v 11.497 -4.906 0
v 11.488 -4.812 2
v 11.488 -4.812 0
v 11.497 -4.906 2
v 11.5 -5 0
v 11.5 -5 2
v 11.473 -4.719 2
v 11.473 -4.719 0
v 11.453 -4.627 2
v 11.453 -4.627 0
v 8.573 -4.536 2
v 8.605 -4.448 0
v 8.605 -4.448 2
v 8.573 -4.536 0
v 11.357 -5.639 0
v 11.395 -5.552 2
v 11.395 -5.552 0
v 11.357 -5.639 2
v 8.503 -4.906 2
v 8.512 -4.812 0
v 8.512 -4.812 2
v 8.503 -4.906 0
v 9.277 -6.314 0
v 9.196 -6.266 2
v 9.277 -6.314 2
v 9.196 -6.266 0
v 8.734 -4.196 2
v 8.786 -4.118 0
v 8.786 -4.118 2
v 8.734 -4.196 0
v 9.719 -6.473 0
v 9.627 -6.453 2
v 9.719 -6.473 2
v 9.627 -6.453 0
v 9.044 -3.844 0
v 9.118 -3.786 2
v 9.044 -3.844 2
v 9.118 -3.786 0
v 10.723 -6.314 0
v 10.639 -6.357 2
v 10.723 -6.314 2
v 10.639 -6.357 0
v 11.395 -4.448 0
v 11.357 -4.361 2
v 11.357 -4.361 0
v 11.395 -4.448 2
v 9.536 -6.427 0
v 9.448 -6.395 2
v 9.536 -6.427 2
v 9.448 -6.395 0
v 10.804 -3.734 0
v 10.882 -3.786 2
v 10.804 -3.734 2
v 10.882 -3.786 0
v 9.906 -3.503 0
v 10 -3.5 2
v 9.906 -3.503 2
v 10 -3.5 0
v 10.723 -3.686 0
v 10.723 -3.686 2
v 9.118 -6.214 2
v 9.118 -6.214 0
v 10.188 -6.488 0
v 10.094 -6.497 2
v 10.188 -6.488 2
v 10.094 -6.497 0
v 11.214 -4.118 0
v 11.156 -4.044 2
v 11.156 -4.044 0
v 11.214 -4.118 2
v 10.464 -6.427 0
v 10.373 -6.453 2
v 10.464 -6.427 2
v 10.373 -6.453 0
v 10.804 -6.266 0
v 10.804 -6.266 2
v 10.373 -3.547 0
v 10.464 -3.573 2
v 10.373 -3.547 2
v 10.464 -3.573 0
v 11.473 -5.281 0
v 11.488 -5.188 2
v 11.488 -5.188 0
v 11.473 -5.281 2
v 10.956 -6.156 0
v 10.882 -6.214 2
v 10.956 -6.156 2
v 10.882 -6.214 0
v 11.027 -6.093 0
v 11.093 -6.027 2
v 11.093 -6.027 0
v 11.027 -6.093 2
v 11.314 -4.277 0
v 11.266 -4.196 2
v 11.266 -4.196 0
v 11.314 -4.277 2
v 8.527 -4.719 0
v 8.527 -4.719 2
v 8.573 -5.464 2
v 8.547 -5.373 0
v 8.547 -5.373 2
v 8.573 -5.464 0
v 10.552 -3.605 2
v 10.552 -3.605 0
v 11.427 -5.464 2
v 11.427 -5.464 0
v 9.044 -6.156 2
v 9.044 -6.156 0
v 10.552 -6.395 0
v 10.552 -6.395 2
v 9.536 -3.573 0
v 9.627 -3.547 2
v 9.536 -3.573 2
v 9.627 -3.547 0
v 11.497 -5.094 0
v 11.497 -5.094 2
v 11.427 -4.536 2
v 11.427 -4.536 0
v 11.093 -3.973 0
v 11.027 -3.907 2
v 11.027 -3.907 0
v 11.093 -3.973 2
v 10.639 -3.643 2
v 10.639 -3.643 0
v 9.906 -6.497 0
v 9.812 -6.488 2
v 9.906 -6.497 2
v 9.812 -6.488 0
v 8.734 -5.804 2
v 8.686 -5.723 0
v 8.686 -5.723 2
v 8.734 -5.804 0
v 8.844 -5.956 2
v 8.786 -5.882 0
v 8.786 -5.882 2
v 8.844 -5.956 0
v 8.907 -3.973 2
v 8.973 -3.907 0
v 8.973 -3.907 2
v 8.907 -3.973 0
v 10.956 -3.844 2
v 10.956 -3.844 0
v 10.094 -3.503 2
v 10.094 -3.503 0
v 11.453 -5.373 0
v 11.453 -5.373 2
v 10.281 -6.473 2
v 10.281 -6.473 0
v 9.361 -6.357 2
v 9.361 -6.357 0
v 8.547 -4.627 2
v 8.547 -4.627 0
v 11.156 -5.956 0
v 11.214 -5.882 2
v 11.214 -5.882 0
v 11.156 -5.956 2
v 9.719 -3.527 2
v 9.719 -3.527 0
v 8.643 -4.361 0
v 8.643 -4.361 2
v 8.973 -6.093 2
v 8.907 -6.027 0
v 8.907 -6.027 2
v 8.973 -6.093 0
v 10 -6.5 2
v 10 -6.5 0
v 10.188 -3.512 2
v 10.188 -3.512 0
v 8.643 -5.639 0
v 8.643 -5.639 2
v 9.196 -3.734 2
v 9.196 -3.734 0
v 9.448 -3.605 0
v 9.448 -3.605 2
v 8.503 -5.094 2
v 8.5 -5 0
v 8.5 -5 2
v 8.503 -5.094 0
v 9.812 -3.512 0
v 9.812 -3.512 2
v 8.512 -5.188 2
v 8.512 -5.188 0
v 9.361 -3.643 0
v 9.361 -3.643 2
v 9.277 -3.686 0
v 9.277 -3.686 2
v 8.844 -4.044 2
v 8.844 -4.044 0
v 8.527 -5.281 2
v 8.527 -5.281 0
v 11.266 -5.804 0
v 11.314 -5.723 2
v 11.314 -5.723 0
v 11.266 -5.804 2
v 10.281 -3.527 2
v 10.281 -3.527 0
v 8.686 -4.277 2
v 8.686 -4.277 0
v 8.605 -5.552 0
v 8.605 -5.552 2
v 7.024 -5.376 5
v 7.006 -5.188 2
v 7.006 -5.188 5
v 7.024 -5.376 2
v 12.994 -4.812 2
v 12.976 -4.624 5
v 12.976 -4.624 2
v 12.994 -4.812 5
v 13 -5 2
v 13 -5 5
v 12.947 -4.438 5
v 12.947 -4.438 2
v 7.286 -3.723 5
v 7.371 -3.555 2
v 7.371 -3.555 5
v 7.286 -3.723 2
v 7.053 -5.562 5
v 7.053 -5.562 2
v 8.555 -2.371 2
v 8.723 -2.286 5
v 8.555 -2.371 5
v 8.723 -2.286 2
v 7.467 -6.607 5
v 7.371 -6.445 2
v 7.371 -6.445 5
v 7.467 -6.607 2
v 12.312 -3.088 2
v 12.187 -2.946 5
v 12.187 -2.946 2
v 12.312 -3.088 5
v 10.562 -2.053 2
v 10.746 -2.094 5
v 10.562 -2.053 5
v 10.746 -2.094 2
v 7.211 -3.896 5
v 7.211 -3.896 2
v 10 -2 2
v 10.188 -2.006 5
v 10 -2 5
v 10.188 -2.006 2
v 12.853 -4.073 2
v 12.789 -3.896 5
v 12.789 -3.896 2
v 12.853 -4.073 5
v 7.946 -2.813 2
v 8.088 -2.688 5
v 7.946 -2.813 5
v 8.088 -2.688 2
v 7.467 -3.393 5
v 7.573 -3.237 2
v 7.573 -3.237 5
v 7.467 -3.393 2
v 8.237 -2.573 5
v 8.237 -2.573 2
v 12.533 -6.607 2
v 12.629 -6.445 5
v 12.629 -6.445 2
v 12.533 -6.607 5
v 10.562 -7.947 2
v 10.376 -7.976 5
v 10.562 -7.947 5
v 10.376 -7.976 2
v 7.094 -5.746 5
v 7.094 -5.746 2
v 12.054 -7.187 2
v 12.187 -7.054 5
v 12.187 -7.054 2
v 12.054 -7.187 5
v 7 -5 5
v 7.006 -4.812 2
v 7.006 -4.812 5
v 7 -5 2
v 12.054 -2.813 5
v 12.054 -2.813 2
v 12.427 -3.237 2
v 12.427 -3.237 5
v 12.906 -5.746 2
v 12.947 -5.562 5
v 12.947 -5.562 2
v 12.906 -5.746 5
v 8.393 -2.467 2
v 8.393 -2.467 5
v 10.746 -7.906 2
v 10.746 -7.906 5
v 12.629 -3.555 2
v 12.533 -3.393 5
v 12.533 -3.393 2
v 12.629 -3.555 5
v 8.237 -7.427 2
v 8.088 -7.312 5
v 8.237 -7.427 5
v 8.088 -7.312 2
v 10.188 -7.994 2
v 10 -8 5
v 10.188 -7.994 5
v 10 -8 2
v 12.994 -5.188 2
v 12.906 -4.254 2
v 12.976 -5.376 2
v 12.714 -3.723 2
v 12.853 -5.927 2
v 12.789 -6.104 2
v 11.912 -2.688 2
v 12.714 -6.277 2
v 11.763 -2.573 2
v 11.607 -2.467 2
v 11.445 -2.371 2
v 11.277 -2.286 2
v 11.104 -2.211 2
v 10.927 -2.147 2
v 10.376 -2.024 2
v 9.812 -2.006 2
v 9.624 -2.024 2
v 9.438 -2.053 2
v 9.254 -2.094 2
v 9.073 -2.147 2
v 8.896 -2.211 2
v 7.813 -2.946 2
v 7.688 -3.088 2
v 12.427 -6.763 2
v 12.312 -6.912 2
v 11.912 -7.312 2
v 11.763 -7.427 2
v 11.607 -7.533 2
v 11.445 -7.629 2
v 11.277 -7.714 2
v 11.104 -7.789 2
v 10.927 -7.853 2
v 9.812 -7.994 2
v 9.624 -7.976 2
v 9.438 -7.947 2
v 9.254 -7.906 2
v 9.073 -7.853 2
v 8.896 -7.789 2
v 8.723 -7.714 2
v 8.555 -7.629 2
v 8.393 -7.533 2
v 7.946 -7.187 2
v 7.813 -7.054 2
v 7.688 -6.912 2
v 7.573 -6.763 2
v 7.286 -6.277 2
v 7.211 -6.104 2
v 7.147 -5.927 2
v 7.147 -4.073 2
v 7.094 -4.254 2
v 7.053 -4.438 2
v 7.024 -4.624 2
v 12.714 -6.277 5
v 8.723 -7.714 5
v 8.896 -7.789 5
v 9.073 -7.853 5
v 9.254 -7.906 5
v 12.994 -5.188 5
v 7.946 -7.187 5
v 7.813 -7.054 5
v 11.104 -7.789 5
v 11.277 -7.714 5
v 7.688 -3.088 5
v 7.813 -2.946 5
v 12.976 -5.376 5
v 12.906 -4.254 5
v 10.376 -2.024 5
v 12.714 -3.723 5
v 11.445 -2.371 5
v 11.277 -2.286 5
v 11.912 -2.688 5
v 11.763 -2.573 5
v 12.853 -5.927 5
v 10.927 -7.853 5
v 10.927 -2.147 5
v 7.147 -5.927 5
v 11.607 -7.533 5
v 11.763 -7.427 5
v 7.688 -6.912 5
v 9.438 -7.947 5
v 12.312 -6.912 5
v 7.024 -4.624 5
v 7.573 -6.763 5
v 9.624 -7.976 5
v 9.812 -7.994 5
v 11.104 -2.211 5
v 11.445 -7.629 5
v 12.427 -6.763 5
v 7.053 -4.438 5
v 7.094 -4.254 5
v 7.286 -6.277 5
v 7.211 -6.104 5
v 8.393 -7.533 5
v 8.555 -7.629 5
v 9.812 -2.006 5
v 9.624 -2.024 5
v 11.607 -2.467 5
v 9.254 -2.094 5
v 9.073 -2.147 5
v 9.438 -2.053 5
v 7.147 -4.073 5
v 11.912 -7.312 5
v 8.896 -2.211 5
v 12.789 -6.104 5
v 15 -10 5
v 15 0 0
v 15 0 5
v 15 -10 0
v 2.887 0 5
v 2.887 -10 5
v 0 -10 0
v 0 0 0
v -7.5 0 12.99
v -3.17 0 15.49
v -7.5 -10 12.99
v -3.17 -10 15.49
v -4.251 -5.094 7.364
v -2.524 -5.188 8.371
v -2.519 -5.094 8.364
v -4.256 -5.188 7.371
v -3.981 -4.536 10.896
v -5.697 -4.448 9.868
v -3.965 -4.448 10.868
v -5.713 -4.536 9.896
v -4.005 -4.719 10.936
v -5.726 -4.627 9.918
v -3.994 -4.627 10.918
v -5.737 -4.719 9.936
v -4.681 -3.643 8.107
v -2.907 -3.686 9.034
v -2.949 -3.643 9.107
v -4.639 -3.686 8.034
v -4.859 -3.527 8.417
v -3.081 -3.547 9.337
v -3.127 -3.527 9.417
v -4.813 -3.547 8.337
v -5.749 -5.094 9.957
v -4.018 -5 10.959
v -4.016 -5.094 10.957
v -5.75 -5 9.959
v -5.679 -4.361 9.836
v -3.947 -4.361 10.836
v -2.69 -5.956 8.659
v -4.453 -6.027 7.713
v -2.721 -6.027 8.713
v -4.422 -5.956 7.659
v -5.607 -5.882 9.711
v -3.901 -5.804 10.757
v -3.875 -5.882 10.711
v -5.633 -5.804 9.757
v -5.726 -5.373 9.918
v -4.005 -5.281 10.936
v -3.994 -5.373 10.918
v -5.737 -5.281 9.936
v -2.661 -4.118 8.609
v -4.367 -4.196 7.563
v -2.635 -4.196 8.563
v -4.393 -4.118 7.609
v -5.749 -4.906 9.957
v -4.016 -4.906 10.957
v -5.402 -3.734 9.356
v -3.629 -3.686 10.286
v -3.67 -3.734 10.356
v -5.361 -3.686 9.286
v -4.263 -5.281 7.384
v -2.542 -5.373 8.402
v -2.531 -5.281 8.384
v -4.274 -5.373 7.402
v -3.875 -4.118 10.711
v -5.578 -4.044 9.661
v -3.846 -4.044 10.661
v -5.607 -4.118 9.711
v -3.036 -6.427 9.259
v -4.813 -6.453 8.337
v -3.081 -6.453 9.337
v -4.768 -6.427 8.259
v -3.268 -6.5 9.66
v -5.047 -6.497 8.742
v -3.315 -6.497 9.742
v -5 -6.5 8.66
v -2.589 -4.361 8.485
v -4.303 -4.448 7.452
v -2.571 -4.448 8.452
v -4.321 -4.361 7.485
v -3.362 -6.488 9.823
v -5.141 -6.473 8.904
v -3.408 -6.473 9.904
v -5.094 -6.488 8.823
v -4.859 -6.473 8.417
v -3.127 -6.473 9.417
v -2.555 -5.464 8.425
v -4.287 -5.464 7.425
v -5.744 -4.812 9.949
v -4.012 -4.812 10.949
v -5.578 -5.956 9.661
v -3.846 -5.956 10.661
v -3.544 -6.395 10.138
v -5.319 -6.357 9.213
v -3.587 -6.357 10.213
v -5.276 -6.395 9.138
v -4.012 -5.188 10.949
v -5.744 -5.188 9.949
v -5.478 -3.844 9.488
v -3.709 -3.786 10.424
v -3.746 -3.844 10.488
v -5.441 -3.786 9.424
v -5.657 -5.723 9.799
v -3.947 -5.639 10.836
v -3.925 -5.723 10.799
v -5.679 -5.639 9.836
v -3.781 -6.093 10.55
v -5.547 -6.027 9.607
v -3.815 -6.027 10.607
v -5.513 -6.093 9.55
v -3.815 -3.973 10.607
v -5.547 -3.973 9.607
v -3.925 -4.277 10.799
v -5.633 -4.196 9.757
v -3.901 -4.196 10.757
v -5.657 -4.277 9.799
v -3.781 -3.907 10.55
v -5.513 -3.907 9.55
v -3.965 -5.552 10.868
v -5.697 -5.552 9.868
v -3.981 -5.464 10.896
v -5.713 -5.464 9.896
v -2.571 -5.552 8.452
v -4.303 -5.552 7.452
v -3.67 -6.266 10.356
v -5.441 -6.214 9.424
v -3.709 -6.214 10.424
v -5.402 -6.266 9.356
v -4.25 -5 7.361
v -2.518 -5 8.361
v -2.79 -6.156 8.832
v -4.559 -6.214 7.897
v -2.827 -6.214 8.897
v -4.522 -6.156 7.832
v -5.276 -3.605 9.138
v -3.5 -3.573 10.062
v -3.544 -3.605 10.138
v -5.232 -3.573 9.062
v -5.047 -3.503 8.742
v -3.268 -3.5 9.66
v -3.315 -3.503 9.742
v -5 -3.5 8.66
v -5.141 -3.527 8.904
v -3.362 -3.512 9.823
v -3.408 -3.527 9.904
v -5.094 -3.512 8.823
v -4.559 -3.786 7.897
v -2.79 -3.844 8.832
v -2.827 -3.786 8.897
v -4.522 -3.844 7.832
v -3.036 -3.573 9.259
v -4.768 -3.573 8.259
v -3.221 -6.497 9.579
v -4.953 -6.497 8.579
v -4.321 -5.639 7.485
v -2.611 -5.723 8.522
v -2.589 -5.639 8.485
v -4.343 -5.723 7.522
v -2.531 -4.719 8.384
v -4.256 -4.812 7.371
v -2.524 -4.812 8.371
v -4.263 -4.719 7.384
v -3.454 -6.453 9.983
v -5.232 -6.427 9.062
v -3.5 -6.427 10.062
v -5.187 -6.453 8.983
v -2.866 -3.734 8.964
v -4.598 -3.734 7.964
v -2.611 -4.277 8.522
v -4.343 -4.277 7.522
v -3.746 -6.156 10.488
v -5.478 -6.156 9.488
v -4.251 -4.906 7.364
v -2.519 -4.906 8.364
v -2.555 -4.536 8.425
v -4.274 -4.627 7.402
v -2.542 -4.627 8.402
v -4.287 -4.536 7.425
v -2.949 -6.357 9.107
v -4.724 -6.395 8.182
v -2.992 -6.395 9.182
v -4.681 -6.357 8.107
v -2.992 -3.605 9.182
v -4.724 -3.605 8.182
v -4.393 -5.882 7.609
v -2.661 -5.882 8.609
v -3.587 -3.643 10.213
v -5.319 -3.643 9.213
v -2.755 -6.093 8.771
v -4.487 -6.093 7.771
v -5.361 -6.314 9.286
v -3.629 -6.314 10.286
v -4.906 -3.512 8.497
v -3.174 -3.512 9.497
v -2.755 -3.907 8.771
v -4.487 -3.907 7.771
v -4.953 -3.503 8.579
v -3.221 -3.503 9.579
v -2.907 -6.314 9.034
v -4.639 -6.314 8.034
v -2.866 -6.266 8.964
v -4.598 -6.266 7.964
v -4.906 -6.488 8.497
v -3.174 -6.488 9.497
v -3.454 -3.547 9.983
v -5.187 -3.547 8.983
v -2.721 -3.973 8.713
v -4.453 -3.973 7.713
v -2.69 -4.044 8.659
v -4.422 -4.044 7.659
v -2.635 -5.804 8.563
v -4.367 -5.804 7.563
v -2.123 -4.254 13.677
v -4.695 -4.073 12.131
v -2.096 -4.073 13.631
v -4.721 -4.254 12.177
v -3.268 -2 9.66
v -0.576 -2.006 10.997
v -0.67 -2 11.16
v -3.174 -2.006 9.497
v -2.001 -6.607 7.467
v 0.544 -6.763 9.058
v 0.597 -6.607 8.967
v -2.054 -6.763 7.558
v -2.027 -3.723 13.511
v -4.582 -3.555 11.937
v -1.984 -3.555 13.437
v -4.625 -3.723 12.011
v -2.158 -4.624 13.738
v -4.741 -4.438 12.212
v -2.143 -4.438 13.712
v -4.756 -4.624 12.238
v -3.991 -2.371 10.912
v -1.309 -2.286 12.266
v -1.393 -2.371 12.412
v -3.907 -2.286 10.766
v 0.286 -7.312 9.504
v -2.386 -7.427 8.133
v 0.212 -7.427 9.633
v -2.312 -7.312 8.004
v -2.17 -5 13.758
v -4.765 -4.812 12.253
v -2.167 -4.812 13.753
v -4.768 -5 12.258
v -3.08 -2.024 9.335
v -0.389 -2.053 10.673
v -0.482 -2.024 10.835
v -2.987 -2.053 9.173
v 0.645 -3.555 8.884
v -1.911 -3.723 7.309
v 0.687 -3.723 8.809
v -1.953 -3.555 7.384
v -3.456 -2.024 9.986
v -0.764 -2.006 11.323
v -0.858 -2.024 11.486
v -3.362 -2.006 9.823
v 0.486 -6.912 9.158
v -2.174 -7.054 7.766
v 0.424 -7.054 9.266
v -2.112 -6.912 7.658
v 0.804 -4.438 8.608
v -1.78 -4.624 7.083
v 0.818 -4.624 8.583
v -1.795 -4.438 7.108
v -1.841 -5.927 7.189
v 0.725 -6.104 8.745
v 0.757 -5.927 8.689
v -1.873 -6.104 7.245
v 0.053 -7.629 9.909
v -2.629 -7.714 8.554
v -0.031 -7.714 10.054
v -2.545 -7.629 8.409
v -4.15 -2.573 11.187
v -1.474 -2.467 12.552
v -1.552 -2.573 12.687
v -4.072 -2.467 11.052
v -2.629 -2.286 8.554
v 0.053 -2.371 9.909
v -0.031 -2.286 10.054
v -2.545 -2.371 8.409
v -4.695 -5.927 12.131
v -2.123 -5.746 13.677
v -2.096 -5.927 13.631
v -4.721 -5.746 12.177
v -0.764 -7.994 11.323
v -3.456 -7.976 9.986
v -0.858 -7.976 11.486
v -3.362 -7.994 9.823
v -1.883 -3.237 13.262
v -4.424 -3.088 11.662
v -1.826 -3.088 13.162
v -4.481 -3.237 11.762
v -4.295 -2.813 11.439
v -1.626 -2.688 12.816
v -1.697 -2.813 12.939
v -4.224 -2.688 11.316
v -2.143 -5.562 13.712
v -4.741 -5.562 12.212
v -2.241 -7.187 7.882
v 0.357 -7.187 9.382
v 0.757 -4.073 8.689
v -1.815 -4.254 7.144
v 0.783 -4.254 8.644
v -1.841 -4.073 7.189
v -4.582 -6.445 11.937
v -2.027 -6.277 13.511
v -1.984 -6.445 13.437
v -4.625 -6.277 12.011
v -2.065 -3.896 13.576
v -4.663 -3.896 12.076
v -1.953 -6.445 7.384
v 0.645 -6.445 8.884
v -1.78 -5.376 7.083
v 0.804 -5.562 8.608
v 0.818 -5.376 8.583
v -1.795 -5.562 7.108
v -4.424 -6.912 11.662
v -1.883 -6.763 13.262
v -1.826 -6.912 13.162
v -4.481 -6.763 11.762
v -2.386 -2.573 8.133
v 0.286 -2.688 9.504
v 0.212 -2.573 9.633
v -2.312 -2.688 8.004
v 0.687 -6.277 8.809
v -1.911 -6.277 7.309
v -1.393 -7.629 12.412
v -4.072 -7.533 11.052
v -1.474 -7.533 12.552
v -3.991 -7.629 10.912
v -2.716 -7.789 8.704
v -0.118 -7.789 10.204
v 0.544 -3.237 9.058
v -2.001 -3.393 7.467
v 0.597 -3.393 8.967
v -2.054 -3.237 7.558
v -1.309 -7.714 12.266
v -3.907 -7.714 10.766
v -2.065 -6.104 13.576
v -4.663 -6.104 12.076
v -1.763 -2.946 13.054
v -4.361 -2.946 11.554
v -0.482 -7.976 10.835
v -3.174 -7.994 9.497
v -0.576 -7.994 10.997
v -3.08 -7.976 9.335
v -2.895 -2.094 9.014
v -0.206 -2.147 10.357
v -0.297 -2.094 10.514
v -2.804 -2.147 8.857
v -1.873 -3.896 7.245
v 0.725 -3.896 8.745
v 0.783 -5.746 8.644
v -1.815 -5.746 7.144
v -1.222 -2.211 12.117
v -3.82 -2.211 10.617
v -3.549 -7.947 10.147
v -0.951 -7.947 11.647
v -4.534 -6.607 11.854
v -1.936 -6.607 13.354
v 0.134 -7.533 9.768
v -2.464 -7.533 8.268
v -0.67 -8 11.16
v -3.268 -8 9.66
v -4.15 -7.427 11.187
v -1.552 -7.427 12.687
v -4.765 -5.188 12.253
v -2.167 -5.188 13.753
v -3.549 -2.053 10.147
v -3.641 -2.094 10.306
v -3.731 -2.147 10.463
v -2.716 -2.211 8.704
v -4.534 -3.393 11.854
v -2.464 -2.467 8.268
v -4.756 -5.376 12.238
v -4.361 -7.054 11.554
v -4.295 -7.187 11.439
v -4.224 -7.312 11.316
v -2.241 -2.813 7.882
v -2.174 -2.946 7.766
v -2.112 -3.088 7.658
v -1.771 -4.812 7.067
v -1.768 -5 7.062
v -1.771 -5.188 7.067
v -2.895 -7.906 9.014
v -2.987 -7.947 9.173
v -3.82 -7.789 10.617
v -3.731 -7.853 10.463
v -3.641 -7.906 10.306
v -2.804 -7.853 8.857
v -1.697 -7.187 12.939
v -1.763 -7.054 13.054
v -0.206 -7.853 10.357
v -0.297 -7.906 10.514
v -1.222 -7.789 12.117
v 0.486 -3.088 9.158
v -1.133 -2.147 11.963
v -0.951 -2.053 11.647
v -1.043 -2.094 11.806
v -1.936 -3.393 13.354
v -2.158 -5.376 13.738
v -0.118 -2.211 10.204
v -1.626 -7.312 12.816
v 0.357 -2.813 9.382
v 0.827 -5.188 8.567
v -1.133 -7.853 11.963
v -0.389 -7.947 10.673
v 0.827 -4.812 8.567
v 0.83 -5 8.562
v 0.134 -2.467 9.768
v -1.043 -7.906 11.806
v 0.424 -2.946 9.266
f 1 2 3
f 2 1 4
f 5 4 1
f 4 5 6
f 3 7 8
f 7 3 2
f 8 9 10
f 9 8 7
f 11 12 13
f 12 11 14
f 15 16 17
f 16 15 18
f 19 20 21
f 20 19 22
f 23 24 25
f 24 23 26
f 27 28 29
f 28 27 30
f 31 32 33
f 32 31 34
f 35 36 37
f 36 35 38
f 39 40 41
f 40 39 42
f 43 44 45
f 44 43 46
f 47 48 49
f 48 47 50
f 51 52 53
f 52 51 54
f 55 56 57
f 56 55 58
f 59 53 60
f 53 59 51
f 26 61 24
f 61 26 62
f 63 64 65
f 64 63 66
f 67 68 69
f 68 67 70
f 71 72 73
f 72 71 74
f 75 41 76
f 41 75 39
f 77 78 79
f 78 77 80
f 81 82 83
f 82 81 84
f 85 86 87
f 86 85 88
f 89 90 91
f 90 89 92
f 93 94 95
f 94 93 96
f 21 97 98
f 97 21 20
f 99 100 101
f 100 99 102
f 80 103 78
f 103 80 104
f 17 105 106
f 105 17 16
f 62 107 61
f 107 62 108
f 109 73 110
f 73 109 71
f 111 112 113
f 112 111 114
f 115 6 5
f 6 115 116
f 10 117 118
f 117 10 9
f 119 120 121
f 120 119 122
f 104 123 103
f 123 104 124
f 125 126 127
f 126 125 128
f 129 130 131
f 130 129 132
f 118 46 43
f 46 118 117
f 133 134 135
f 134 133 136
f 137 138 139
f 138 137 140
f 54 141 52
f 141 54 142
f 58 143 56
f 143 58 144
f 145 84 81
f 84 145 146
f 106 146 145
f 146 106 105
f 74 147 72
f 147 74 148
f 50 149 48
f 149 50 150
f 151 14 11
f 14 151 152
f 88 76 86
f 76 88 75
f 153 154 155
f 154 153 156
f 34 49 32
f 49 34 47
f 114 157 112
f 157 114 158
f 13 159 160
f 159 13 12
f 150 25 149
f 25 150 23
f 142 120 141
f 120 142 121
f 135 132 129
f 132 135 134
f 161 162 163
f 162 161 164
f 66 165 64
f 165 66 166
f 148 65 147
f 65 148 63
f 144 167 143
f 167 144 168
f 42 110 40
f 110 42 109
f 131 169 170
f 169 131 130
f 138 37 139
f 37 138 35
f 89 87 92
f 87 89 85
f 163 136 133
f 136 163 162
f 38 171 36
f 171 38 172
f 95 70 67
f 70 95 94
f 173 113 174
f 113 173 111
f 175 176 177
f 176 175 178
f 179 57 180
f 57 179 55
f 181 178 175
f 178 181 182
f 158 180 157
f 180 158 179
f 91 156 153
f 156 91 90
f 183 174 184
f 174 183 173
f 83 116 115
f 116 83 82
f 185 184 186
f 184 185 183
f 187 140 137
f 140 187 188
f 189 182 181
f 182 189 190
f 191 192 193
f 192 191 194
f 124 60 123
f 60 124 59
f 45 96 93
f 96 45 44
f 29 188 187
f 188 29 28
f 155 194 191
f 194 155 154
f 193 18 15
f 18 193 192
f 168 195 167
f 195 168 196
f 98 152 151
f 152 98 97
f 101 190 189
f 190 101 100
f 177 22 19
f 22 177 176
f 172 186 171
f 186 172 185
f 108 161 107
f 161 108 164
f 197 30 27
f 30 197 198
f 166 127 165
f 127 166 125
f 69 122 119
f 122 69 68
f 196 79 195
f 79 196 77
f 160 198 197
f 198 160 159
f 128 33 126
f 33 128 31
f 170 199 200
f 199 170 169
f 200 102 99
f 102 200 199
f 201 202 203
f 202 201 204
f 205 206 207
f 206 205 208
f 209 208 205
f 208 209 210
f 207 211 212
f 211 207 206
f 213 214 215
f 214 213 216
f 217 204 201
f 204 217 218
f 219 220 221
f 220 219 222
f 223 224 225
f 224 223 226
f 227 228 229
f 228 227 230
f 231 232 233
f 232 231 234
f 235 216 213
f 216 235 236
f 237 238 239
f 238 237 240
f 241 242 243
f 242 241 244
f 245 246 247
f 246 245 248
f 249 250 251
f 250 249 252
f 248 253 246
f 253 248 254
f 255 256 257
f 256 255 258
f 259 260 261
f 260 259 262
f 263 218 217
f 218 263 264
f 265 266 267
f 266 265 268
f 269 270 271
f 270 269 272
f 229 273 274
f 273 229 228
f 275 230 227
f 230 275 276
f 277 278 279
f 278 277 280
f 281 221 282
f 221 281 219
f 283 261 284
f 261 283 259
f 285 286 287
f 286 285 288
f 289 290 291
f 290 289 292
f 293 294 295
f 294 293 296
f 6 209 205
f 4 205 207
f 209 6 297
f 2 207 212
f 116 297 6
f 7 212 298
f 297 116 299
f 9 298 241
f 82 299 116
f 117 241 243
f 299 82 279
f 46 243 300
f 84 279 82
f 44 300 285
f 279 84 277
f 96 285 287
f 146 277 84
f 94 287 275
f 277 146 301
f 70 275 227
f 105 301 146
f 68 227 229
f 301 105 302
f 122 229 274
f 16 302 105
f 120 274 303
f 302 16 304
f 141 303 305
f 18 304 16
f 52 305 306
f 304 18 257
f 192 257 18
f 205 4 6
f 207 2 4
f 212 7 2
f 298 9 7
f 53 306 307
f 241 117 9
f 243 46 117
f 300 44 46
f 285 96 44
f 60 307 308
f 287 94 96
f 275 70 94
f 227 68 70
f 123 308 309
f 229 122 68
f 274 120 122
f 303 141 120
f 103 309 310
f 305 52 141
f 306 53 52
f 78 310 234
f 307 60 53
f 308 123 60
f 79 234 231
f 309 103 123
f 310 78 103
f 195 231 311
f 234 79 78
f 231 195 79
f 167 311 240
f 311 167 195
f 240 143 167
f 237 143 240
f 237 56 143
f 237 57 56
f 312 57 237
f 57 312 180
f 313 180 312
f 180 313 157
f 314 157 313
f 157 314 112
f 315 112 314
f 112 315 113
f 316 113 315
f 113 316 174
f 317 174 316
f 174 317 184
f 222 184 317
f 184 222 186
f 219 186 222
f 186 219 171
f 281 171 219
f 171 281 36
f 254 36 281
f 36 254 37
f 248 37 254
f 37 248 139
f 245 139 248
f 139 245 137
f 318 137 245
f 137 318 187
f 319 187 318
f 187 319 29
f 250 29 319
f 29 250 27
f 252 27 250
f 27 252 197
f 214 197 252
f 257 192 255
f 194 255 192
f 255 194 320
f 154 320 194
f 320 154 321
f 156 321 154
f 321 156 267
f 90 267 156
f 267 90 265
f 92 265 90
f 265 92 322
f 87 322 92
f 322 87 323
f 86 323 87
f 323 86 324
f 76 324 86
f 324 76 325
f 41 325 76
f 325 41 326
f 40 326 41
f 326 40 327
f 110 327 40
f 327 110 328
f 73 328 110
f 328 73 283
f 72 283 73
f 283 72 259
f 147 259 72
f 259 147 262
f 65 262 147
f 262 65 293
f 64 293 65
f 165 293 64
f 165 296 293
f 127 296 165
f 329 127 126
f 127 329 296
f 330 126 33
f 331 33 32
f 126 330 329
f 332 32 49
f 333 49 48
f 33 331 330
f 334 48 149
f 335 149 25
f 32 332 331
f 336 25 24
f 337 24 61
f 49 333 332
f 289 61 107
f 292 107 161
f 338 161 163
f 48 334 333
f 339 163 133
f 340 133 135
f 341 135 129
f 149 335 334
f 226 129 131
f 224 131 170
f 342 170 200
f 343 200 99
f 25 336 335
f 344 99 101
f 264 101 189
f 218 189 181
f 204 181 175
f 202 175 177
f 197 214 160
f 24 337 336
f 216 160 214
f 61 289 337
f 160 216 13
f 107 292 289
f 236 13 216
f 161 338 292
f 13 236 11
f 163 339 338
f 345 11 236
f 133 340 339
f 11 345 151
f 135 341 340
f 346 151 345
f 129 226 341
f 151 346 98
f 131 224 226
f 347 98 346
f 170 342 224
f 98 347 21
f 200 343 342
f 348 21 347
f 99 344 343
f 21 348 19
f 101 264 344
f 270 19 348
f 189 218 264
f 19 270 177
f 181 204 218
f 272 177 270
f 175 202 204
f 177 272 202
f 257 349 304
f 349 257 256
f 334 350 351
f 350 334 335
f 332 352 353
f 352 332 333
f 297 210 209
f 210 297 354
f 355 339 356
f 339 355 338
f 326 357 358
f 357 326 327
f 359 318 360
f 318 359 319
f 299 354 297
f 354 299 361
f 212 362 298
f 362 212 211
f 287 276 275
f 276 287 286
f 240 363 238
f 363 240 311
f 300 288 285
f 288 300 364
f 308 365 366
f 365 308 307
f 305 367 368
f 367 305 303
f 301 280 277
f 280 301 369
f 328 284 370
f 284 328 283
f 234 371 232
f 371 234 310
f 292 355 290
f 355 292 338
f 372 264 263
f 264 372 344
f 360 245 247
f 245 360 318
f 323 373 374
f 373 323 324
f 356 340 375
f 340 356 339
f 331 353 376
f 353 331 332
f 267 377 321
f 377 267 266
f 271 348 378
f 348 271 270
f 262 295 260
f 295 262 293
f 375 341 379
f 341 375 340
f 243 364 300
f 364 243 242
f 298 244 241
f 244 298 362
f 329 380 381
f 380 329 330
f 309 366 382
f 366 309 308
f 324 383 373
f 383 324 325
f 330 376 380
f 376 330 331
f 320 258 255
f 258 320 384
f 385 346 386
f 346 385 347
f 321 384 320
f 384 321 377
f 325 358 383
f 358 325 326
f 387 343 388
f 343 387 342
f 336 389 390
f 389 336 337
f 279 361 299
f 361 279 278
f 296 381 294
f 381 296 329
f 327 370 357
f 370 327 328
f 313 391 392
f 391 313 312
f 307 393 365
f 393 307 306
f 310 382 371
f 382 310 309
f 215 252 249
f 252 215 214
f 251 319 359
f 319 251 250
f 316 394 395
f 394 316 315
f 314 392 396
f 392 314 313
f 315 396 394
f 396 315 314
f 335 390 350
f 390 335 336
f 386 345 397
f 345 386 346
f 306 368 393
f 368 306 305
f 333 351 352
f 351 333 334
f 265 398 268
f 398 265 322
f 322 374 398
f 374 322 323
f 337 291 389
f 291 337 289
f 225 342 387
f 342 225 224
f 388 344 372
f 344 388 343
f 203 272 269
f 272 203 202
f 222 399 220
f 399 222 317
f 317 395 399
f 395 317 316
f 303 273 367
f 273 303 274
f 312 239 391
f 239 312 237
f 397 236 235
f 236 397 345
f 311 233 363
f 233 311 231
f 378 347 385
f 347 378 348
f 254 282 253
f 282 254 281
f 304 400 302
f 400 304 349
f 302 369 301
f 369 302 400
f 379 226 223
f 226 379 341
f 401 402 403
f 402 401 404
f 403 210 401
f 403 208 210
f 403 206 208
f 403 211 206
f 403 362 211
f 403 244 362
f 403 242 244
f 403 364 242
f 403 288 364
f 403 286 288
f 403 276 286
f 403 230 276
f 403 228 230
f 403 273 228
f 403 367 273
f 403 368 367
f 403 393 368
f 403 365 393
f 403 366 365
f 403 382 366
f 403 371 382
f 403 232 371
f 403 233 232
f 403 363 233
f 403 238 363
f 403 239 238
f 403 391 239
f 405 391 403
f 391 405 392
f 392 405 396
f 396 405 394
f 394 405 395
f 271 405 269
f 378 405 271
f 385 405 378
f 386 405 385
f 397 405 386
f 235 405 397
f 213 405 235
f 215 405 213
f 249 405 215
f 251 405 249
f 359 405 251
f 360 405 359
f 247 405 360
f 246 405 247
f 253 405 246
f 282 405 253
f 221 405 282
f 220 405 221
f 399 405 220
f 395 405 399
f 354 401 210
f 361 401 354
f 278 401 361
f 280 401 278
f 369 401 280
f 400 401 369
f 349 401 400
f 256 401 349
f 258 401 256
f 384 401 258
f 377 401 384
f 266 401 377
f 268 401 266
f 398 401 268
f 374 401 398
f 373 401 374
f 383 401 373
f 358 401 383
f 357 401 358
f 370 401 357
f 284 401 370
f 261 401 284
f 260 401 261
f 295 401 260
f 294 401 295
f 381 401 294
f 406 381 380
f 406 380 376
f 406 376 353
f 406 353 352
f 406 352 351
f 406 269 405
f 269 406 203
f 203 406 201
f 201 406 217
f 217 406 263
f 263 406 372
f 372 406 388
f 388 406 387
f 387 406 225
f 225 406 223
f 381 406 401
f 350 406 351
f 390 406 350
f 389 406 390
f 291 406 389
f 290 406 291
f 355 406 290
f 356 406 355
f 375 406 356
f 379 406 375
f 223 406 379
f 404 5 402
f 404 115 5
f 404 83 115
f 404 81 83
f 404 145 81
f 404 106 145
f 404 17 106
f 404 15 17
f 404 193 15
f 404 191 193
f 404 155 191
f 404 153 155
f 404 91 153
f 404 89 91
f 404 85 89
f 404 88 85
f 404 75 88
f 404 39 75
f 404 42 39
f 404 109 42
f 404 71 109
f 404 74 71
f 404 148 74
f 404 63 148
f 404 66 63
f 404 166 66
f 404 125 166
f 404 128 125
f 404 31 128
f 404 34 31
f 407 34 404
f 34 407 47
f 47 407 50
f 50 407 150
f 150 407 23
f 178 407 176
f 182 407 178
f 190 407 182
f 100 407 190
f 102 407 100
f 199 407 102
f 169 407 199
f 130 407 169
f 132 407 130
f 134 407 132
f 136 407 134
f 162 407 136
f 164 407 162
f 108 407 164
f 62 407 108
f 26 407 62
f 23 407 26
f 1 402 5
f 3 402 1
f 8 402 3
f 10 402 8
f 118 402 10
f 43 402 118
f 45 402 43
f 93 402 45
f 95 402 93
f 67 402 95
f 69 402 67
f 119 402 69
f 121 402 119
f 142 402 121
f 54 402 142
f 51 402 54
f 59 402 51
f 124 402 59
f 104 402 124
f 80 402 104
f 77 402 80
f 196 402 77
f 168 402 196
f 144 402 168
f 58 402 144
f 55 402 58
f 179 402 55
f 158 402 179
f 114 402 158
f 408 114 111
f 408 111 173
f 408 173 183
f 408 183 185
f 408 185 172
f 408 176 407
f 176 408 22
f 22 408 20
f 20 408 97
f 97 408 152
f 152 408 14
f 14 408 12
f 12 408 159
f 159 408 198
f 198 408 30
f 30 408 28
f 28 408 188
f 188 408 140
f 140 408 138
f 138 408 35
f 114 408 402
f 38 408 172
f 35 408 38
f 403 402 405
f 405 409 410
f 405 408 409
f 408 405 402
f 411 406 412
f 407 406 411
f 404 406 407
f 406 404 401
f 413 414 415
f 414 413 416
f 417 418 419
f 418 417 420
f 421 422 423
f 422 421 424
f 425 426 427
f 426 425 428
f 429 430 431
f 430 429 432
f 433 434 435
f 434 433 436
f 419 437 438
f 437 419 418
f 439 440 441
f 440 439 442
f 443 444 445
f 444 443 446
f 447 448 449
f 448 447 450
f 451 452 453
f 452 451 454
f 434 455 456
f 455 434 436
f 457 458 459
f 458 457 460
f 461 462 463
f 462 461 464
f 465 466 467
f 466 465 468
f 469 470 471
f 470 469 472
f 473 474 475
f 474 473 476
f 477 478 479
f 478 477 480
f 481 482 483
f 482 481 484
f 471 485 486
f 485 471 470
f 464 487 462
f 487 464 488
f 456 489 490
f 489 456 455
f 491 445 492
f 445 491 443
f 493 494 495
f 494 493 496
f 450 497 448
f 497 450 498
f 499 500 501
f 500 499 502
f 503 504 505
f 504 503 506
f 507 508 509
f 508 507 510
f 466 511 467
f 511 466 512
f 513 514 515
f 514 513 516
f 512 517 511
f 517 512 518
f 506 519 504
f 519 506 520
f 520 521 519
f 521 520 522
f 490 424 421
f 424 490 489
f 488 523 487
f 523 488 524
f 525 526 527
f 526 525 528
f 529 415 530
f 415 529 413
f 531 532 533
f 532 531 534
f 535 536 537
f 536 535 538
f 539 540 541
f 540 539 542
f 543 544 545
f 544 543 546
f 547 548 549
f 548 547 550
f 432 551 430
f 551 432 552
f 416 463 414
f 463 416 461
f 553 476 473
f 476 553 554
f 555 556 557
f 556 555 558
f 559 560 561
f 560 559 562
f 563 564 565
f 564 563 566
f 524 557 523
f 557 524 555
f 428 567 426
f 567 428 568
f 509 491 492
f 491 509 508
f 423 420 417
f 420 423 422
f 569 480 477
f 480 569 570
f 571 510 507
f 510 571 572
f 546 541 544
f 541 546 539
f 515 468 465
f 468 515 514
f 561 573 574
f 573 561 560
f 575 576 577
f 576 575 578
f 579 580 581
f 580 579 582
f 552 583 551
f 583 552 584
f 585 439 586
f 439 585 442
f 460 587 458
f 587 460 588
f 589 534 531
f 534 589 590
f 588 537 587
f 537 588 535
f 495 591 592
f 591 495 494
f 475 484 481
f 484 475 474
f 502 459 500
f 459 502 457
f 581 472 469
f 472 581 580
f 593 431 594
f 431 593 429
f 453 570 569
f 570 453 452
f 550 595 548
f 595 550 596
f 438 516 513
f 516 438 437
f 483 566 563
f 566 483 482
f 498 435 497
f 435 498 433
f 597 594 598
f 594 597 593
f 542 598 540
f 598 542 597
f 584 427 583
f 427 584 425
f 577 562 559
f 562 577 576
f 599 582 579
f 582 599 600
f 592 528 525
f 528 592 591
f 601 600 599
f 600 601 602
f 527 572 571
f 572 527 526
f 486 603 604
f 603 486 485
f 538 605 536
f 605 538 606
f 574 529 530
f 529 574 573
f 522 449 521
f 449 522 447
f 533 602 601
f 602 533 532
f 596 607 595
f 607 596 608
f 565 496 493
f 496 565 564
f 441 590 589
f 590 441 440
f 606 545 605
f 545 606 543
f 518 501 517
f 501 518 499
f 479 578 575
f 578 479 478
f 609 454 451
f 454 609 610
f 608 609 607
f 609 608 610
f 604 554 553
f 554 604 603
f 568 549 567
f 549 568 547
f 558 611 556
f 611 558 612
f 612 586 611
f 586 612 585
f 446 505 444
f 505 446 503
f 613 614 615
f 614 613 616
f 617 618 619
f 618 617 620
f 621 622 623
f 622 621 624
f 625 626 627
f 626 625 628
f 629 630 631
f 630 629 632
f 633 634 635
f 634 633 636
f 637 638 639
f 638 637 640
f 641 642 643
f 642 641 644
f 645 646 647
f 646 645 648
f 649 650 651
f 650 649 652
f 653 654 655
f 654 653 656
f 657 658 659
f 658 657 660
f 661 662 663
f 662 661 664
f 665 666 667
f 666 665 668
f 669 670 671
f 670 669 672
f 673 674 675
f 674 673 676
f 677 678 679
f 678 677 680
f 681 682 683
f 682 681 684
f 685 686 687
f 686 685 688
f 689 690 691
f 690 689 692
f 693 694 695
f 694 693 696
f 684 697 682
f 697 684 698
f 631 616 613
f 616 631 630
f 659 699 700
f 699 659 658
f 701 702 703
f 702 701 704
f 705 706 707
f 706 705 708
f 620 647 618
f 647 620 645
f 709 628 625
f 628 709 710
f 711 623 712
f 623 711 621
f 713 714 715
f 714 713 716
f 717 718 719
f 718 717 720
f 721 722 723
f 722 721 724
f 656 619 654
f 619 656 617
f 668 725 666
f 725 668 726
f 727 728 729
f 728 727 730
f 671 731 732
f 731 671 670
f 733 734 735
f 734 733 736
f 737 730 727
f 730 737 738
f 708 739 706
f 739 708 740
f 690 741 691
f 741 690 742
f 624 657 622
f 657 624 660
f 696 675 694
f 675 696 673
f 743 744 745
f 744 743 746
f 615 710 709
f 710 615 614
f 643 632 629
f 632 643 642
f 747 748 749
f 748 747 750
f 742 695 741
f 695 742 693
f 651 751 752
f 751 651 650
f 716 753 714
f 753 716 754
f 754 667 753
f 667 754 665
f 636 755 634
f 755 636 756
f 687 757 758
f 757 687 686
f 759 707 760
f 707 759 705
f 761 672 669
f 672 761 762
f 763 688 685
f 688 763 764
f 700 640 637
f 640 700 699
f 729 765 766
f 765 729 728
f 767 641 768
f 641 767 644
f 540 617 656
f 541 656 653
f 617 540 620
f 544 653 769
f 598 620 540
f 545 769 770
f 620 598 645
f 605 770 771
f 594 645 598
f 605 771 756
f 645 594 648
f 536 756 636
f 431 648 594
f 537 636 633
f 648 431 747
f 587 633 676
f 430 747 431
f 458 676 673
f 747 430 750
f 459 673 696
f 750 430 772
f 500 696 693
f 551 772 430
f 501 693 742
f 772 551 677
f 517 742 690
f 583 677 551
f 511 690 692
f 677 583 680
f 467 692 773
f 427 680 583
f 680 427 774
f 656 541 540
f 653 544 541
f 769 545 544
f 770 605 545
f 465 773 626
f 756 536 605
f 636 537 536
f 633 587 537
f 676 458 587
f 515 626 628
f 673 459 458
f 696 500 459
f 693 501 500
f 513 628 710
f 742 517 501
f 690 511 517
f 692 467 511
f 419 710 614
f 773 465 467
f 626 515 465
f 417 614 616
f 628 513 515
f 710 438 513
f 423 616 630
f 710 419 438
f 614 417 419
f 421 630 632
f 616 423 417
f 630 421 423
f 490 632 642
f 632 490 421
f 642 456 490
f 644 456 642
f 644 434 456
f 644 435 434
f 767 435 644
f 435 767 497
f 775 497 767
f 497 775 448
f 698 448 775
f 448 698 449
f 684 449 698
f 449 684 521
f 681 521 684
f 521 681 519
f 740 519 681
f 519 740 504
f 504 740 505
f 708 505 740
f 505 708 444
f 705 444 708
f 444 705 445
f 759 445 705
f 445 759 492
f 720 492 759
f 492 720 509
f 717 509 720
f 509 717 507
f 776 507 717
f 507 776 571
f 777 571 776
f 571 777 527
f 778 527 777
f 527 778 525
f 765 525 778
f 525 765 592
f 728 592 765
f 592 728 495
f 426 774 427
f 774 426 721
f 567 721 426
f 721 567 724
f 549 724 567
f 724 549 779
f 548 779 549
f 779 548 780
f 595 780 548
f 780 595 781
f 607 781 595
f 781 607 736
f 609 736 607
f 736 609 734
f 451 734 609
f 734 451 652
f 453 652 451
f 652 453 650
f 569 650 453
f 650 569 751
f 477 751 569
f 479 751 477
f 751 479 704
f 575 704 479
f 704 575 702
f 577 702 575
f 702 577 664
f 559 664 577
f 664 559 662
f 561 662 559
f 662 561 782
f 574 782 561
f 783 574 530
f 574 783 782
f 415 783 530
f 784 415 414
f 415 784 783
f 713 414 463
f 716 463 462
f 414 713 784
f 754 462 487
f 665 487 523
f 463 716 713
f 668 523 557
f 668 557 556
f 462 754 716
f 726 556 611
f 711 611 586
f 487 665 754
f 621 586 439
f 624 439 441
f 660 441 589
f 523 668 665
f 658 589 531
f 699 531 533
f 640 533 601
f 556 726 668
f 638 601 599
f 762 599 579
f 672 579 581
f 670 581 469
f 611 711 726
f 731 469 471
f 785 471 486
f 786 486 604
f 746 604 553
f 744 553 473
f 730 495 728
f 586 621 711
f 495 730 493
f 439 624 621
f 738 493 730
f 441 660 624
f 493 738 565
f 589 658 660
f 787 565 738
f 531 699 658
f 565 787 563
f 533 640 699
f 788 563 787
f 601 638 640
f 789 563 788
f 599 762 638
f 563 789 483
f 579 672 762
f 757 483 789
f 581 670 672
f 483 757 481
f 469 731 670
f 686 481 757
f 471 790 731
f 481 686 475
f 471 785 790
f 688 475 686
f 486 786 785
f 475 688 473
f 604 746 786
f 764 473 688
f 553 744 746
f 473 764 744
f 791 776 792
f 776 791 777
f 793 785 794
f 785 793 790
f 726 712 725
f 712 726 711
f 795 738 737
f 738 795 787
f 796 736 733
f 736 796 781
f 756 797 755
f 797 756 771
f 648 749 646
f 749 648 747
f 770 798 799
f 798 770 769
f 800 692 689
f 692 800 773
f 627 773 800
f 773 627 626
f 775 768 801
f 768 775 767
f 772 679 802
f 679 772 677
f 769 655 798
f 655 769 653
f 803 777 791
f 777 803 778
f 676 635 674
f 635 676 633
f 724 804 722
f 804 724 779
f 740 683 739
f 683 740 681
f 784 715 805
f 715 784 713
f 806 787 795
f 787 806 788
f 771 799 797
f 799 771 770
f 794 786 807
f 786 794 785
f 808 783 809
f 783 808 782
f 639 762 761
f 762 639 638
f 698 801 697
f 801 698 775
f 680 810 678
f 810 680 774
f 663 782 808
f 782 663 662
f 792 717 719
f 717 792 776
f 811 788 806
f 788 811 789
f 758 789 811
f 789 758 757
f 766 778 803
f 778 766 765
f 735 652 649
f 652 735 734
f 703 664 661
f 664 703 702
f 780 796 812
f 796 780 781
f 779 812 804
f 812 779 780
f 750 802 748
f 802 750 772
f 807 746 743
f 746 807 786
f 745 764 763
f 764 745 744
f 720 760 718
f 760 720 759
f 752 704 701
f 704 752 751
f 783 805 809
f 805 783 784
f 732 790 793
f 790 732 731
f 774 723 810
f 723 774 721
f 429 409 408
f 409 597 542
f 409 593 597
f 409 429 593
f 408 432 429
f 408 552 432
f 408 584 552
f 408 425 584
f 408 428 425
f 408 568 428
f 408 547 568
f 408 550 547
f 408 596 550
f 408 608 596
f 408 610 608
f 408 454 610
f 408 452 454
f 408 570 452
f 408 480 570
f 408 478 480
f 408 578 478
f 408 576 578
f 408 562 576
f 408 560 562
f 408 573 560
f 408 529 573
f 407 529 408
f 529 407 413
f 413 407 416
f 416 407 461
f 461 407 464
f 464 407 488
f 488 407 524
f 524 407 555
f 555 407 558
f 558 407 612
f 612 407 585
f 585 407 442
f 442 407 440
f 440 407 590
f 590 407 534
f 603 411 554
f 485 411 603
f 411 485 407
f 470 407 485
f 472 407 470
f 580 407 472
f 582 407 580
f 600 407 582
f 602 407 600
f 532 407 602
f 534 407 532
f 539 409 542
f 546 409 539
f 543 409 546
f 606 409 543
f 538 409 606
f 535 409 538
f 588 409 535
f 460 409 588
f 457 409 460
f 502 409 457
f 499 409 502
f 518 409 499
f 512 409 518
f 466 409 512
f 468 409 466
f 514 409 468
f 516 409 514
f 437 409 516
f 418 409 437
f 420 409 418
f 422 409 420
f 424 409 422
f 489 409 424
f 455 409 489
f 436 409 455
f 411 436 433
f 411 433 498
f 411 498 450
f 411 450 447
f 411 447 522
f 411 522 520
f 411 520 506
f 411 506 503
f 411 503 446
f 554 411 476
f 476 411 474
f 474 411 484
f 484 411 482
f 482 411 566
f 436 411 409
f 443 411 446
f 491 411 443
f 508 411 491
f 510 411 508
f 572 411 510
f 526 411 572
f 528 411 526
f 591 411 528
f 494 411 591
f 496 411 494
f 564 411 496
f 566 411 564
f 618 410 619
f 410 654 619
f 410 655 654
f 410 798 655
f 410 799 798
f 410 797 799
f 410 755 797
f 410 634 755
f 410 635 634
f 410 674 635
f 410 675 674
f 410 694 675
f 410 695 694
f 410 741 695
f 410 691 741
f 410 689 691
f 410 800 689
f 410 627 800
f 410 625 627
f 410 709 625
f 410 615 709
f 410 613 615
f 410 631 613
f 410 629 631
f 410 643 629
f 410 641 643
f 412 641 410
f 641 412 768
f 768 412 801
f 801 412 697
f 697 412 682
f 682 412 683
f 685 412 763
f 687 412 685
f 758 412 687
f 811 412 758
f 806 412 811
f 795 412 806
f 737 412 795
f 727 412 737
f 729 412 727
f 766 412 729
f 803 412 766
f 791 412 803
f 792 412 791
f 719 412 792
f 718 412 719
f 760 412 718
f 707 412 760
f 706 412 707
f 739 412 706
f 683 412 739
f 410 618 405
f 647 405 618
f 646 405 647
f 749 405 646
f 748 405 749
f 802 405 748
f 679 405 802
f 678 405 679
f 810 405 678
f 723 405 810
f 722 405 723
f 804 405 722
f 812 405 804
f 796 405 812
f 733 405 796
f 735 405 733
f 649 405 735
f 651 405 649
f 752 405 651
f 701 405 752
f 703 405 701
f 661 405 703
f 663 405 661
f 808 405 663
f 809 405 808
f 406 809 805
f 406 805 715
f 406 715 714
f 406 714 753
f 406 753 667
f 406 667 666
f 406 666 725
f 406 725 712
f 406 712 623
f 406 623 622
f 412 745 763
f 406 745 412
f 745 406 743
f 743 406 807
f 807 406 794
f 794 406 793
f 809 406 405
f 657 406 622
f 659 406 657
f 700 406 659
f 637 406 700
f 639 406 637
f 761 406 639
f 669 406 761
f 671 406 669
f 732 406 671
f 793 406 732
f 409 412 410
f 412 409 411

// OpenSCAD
// ************* Credits part *************
// "Fixing customize w" 
// Programmed by Rudy RUFFEL - Decembre 2014
// Optimized for Customizer makerbot
//
//
//********************** License ******************
//**         "Fixing customize" by rr2s          **
//**  is licensed under the Creative Commons     **
//** - Attribution - Non-Commercial license.     **
//*************************************************
//
//
// ************* Declaration part *************

/* [Dimensions] */ 
// (Width this number will be multiplied by the number of screws on height (in mm). Example : if you specify 15mm and there are two screws on height, the total height will be 30mm. The thickness of wall is proportional to the width if you indicates a width 15mm  the thickness will  5mm. But you can change if you wantt hickness in tab)
Width         = 15;       
// (Length of fixing this number will multipier by the number of screw on length (in mm). Example : if you specify 10 and there are two screws on length, the total length will be 20.)
Height        = 10;
// Angle is 60 °. It can not be over because the screws not spend mounting. You can choose an angle between 90 ° and 0 °.
angle = 60;


/* [screw] */
// (number of height screw, if you want one screw.)
NumberOfScrewHeight  = 1;
// (number of width screw)
NumberOfScrewWidth = 1  ; 
// (diameter of screw) 
DiametreScrew = 3;        
// (screw head diameter of generally 2 times the diameter of the screw. Attention ! Check that the width and height is supperior in diameter screws.)
DiametreHeadScrew = 6;
// (Height of the screw head, if you want that screw is flush chose 0. Attention ! Check that the width and height is supperior in diameter screws.)
HeightHeadScrew   = 3;
// (Resolution of screws)
ResolutionScrew=100; //[20:Draft,50:Medium,100:Fine, 200:Very fine]
	RS = ResolutionScrew;
// (Creates a hex or cylindrical head screws)
ResolutionHeadScrew=100; //[6:Bolt (hex),20:Draft,50:Medium,100:Fine, 200:Very fine]
	RH = ResolutionHeadScrew;


/* [Thickness] */
//(Thickness Wall is normaly proportional to the width (Width/3) if ThicknessWall = 0. But you can change if you want. Attention ! Check that the Thickness Wall is supperior at HeightHeadScrew.the dimention is in mm)
ThicknessWall = 0;



// ************* private variable *************
	//TH = Width/3;  //  ThicknessWall base if ThicknessWall = 0
	TH= ThicknessWall == 0  ? Width/3 : ThicknessWall;
	W = Width;     // Simplifying the Variable : Width 
	H = Height;    // Simplifying the Variable : Height
    NbScrew = NumberOfScrewHeight -1; // Simplifying the Variable : NumberOfScrewHeight
	rScrew = DiametreScrew/2;      // radius of the screw
	CWS = TH+((W-TH)/2); // centering the screw on width
	CHS = H/2; // centering the screw on Height
	rHScrew = DiametreHeadScrew/2;  //radius of the Head screw
	HHS = HeightHeadScrew; // Simplifying the Variable : HeightHeadScrew
	NbScrewWidth = NumberOfScrewWidth-1; // Simplifying the Variable :  NumberOfScrewWith


// ************* Executable part *************
union(){
    difference(){
        Base1();
        Cut();
    }

    rotate([0,angle-90,0])difference(){
        Base2();
        Cut();
    }
}



// ************* Module part simple screw *************

// Module de construction
module BaseVolume1(){
	for ( i = [0 : NbScrew] ){
		translate([0,(H*i)-H,0])  cube([W,H,TH]);
		}
}

// Module de construction
module BaseVolume2(){
	for ( i = [0 : NbScrew] ){
		translate([TH,(H*i)-H,0]) rotate([0,-90,0]) cube([W,H,TH]);
		}
}

module BaseScrew(){
	for ( i = [0 : NbScrew] ){
		translate([CWS,CHS+((i*H)-H),-W]) cylinder(W*2,rScrew,rScrew,$fn=RS);
		translate([W,CHS+((i*H)-H),CWS]) rotate([0,-90,0]) cylinder(W*2,rScrew,rScrew,$fn=RS);
	}
}

module BaseScrewHead(){
	for ( i = [0 : NbScrew] ){
		translate([CWS,CHS+((i*H)-H),TH-HHS]) cylinder(W*2,rHScrew,rHScrew,$fn=RH);
		translate([(W*2)+TH-HHS,CHS+((i*H)-H),CWS]) rotate([0,-90,0]) cylinder(W*2,rHScrew,rHScrew,$fn=RH);
	}
}

// ************* Module part multi-screw *************

 module BaseVolume1MultiScrew(){
	for ( e = [0 : NbScrewWidth] ){
		for ( i = [0 : NbScrew] ){
			union() {
			translate([(W-TH)*e+TH,(H*i)-H,0])cube([W-TH,H,TH]);
			}
		}
	}
}

 module BaseVolume2MultiScrew(){
	for ( e = [0 : NbScrewWidth] ){
		for ( i = [0 : NbScrew] ){
			union() {
			translate([TH,(H*i)-H,(W-TH)*e+TH]) rotate([0,-90,0]) cube([W-TH,H,TH]);
			}
		}
	}
}


module BaseScrewMulti(){
	for ( e = [0 : NbScrewWidth] ){
		for ( i = [0 : NbScrew] ){
			translate([CWS+((W-TH)*e),CHS+((i*H)-H),-W]) cylinder(W*2,rScrew,rScrew,$fn=RS);
			translate([W,CHS+((i*H)-H),CWS+(W-TH)*e]) rotate([0,-90,0]) cylinder(W*2,rScrew,rScrew,$fn=RS);
		}
	}
}


module BaseScrewHeadmulti(){
	for ( e = [0 : NbScrewWidth] ){
		for ( i = [0 : NbScrew] ){
			translate([CWS+((W-TH)*e),CHS+((i*H)-H),TH-HHS]) cylinder(W*2,rHScrew,rHScrew,$fn=RH);
			translate([(W*2)+TH-HHS,CHS+((i*H)-H),CWS+(W-TH)*e]) rotate([0,-90,0]) cylinder(W*2,rHScrew,rHScrew,$fn=RH);
		}
	}
}

// ************* Module grouping : base and cut  *************

// module of base
module Base1(){
        BaseVolume1();
		if (NbScrew > 0 || NbScrewWidth > 0) {
		BaseVolume1MultiScrew();
		}
}

// module of base
module Base2(){
		BaseVolume2();
		if (NbScrew > 0 || NbScrewWidth > 0) {
        BaseVolume2MultiScrew();   
		}
}



// module of cut
module Cut(){
	BaseScrew();
	BaseScrewHead();
 	if (NbScrew > 0 || NbScrewWidth > 0) {
	BaseScrewMulti();
	BaseScrewHeadmulti();
	}
}











